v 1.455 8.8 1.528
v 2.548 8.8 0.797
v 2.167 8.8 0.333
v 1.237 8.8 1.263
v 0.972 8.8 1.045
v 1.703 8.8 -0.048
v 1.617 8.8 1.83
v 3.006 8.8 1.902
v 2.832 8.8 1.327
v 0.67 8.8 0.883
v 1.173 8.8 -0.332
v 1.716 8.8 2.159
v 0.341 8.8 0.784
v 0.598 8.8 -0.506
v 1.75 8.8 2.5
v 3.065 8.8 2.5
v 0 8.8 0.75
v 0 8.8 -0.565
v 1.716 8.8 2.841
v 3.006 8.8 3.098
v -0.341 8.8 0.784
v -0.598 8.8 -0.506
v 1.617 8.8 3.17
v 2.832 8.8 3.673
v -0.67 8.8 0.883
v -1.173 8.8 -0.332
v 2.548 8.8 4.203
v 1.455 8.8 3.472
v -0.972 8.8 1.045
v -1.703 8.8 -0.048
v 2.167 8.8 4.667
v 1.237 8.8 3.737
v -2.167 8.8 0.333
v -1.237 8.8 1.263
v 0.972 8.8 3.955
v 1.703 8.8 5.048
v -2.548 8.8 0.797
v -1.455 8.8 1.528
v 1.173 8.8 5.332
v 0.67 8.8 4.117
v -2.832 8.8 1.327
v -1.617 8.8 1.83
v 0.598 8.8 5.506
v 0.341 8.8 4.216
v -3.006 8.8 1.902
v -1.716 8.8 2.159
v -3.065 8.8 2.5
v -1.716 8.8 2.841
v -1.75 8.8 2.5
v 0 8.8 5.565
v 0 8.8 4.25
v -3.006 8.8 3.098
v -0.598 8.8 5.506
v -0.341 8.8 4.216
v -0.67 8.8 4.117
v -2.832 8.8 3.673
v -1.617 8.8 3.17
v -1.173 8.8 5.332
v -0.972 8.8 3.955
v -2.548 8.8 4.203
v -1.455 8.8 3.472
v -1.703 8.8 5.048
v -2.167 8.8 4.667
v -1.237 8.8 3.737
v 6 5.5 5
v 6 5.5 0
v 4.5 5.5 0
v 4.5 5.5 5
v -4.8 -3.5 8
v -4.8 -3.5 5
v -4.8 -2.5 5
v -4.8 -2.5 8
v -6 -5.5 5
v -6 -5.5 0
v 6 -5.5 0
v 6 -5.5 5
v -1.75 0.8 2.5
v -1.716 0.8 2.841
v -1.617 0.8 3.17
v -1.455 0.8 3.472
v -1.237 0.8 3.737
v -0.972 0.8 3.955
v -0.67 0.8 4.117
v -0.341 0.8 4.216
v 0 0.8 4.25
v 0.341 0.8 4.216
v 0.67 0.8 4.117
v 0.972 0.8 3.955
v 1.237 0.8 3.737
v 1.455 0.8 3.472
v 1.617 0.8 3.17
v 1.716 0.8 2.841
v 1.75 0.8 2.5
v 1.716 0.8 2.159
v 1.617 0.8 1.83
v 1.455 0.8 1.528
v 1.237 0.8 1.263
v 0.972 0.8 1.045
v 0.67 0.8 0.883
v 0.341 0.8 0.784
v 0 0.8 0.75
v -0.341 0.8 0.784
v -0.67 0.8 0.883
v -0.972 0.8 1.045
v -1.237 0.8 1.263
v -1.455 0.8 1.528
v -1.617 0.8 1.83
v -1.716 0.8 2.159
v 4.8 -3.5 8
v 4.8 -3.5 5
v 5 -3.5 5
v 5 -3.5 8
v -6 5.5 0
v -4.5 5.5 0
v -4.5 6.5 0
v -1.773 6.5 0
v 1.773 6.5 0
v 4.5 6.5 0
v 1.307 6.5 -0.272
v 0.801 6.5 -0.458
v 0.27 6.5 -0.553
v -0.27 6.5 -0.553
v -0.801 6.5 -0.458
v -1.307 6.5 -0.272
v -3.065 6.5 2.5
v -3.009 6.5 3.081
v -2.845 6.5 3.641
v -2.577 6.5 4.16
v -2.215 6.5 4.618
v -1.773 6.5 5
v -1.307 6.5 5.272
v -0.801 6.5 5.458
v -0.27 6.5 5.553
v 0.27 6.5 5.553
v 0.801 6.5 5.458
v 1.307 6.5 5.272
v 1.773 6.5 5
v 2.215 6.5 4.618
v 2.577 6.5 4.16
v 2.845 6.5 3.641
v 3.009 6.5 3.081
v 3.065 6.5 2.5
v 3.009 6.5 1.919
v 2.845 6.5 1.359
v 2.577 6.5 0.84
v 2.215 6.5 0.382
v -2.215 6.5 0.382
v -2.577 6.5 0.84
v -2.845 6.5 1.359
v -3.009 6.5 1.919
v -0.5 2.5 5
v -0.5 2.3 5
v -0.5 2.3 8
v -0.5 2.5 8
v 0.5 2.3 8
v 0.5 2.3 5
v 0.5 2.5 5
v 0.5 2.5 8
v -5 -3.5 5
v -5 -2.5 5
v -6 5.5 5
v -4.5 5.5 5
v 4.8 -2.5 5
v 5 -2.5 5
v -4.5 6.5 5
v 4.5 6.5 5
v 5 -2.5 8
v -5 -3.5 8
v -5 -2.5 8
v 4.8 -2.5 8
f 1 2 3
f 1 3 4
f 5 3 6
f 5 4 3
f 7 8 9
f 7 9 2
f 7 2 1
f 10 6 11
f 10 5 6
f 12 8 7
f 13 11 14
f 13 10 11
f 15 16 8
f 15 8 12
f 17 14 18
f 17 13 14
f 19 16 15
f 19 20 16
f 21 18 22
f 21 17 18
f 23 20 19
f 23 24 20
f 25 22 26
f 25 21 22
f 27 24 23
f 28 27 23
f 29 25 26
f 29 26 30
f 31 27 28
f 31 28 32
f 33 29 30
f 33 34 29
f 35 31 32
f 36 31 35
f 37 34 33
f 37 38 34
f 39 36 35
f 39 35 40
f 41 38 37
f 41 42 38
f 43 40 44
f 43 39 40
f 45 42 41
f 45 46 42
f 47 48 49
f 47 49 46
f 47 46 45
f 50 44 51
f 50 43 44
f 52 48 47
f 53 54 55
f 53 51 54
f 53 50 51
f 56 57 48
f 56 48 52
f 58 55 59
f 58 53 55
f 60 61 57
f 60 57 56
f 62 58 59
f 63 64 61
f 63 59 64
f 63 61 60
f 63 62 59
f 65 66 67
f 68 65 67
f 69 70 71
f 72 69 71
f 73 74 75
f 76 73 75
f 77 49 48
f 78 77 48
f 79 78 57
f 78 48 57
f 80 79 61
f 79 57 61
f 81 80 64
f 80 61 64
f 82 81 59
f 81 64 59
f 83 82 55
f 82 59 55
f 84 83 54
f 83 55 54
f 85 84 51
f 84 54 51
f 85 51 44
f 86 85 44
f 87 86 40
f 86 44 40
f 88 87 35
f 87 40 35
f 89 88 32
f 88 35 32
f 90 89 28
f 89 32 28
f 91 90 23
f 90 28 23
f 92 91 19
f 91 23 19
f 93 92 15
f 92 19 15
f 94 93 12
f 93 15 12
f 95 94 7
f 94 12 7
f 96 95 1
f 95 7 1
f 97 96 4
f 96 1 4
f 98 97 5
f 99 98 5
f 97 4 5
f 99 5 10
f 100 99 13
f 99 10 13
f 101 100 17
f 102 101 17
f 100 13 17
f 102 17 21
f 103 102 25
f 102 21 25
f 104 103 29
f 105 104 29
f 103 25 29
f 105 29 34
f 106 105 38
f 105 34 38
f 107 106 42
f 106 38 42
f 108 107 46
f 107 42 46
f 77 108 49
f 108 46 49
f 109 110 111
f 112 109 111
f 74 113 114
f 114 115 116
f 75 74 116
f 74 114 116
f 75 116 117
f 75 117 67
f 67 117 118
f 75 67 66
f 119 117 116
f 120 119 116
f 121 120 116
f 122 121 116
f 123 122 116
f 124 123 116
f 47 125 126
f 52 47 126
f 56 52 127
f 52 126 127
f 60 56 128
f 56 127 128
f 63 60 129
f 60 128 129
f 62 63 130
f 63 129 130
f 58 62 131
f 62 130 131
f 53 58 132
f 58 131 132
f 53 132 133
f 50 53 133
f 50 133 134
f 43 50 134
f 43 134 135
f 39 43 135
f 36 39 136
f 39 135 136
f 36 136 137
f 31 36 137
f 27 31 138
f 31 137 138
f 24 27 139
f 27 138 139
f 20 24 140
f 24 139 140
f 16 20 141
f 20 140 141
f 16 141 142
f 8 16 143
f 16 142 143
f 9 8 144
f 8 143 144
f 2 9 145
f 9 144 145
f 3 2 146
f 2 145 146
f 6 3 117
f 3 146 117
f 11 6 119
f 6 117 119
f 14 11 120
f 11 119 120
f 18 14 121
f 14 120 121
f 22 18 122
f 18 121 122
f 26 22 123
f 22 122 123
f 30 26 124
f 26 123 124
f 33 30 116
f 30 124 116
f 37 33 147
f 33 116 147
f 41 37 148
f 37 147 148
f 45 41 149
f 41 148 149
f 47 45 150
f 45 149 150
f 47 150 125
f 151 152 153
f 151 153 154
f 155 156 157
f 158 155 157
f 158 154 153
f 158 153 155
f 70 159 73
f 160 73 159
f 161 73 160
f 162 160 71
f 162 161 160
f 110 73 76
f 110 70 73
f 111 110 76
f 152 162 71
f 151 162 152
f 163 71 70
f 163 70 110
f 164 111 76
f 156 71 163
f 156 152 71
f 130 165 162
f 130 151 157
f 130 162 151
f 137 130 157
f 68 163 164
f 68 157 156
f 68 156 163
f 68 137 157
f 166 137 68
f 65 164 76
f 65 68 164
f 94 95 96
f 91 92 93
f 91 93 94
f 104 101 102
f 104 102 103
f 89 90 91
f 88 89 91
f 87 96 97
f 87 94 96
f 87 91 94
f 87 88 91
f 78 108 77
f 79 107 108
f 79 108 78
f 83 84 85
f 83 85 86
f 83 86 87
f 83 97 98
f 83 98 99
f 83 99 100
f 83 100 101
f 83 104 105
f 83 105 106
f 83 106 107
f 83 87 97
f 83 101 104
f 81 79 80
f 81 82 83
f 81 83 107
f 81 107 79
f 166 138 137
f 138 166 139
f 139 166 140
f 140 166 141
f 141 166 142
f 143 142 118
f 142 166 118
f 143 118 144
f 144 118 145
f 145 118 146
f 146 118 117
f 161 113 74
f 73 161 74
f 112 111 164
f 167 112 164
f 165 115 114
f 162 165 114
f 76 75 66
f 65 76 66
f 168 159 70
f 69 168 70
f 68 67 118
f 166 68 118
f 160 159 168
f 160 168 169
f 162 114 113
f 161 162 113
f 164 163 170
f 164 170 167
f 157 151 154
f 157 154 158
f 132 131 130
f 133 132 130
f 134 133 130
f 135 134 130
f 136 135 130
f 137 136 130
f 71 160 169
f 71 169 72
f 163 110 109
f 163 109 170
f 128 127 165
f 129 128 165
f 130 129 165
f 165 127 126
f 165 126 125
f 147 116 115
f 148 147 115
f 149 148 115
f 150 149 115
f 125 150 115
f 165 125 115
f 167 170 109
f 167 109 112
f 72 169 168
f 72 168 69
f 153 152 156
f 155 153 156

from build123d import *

# Parameters (mm, degrees)
F1_DEPTH = 5
F2_R     = 3.065
F3_DEPTH = 2.3
F4_R     = 1.75
F5_DEPTH = 8
F6_W     = 0.2
F6_H     = 1
F6_W_2   = 1
F6_H_2   = 0.2
F7_DEPTH = 3


with BuildPart() as f1:
    # F0 (on Top) → F1 (new body)
    with BuildSketch(Plane.XY):
        Polygon((6, -5.5), (6, 5.5), (4.5, 5.5), (4.5, 6.5), (-4.5, 6.5), (-4.5, 5.5), (-6, 5.5), (-6, -5.5), align=None)
    extrude(amount=F1_DEPTH)

    # F2 (on face) → F3 (join)
    with BuildSketch(Plane(origin=(0, 6.5, 0), x_dir=(-1, 0, 0), z_dir=(0, 1, 0))):
        with Locations((0, 2.5)):
            Circle(F2_R)
    extrude(amount=F3_DEPTH)

    # F4 (on face) → F5 (cut)
    with BuildSketch(Plane(origin=(0, 8.8, 0), x_dir=(-1, 0, 0), z_dir=(0, 1, 0))):
        with Locations((0, 2.5)):
            Circle(F4_R)
    extrude(amount=-F5_DEPTH, mode=Mode.SUBTRACT)

    # F6 (on face) → F7 (join)
    with BuildSketch(Plane.XY.offset(5)):
        with Locations((4.9, -3)):
            Rectangle(F6_W, F6_H)
        with Locations((-4.9, -3)):
            Rectangle(F6_W, F6_H)
        with Locations((0, 2.4)):
            Rectangle(F6_W_2, F6_H_2)
    extrude(amount=F7_DEPTH)


solid = f1.part
